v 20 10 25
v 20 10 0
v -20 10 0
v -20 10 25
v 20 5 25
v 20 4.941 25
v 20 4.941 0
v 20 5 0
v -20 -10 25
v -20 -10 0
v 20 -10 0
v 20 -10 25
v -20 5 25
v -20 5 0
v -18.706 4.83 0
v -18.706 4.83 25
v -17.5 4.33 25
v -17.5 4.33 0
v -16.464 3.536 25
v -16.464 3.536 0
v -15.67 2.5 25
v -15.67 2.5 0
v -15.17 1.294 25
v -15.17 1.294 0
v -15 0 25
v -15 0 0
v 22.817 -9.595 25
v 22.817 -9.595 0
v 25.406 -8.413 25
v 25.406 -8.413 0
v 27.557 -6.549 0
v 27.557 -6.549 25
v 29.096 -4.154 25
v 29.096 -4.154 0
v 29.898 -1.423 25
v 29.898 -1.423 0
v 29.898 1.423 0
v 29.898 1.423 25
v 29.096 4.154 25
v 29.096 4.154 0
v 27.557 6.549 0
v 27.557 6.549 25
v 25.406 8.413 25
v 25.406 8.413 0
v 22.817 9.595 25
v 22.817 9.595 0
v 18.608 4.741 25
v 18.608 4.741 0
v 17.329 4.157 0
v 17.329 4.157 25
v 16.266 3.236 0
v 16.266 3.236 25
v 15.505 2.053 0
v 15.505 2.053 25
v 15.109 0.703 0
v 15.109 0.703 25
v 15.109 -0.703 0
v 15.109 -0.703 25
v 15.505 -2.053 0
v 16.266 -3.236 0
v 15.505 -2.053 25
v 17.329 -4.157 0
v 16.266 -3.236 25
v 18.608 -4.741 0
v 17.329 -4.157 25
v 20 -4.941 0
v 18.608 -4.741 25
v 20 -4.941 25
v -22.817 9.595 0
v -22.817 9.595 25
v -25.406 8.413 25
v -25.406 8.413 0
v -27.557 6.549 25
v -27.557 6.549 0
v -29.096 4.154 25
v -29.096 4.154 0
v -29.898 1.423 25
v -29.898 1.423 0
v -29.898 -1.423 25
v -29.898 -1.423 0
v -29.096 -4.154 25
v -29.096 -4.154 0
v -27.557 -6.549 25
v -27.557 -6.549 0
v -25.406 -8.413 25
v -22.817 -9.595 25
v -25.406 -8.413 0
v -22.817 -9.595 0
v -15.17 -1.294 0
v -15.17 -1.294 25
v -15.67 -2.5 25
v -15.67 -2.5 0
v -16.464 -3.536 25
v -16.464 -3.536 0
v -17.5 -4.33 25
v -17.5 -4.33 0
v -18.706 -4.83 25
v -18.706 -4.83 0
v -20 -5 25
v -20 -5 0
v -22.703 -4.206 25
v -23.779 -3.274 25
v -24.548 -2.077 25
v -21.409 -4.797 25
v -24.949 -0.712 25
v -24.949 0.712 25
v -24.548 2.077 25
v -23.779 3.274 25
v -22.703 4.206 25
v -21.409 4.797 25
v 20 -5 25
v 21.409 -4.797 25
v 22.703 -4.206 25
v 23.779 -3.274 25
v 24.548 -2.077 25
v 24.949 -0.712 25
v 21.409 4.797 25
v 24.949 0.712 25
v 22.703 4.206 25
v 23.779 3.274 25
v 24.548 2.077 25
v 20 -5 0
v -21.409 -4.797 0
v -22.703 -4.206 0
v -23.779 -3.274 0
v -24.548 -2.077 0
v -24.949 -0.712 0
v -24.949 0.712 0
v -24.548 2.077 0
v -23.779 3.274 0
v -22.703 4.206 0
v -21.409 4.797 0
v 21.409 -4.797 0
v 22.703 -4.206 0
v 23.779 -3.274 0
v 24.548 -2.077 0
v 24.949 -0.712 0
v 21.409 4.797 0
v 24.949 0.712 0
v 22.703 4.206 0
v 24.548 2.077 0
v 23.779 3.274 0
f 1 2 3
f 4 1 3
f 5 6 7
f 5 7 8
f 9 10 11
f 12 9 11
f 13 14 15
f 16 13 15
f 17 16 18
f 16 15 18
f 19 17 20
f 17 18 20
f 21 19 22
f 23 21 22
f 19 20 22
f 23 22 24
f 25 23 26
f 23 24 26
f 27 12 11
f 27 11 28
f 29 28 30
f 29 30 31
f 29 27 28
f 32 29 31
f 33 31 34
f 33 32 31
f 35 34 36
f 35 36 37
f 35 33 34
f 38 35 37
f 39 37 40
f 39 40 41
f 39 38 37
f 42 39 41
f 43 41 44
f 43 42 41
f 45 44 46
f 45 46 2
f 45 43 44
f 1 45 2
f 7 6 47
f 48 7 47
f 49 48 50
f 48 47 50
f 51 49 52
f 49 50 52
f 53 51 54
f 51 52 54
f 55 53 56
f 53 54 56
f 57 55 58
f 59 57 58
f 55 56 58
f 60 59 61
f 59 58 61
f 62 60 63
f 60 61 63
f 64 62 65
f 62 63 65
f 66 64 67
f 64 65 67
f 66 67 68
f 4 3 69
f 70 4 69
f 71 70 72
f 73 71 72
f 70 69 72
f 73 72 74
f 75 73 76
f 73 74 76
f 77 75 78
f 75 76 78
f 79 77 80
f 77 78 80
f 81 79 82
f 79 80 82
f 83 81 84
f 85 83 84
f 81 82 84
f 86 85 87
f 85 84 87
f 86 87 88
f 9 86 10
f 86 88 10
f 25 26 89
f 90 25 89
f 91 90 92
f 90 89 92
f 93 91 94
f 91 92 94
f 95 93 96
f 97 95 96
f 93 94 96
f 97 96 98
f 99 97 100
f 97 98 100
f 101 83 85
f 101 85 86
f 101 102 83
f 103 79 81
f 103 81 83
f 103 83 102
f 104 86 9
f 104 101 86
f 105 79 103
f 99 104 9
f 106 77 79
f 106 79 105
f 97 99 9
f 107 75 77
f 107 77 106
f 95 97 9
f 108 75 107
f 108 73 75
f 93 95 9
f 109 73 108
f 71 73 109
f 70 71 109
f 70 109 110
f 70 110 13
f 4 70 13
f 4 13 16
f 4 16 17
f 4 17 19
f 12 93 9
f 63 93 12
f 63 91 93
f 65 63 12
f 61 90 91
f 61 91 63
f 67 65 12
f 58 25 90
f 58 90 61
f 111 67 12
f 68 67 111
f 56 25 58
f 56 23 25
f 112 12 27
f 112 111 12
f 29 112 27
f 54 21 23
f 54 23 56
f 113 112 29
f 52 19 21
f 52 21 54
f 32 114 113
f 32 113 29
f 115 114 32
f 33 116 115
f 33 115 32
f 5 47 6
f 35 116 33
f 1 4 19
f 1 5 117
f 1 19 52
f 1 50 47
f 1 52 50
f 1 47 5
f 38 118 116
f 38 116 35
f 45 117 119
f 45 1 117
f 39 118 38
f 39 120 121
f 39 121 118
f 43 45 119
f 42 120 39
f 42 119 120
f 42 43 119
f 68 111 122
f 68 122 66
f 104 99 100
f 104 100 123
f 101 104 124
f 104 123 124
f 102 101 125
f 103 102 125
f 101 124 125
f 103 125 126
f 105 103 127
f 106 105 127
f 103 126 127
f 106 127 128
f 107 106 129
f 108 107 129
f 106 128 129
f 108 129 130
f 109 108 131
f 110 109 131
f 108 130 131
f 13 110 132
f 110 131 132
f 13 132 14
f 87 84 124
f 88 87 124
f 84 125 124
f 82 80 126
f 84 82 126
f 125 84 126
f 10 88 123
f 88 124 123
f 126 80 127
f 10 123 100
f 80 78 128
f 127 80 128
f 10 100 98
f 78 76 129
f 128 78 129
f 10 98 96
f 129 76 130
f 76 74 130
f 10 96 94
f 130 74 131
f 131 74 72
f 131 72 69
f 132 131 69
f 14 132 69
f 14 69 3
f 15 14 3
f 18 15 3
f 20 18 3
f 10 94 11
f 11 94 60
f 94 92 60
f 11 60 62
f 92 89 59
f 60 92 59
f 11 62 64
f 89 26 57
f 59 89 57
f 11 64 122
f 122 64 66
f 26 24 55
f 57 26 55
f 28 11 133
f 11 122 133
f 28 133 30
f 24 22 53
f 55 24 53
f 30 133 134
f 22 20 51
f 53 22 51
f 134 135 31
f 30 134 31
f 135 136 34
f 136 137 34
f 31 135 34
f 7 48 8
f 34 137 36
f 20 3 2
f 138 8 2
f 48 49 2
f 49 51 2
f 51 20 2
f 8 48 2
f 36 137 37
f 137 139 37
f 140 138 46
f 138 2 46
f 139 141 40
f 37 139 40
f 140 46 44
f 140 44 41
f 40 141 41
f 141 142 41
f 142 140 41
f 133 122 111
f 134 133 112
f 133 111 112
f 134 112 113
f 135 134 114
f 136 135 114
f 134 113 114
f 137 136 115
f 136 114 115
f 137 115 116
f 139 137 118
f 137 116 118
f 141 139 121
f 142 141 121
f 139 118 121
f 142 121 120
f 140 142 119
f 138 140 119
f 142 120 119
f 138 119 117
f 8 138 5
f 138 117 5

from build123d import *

# Parameters (mm, degrees)
F1_DEPTH = 25
F2_R     = 10
F2_R_2   = 5
F3_DEPTH = 25
F4_R     = 4.9411574471
F5_DEPTH = 25.001


with BuildPart() as f1:
    # F0 (on Top) → F1 (new body)
    with BuildSketch(Plane.XY):
        with BuildLine():
            Line((-20, -10), (20, -10))
            Line((20, -10), (20, 10))
            Line((20, 10), (-20, 10))
            ThreePointArc((-20, 10), (-12.9289321881, 7.0710678119), (-10, 0))
            ThreePointArc((-10, 0), (-12.9289321881, -7.0710678119), (-20, -10))
        make_face()
        with BuildLine():
            ThreePointArc((-20, 10), (-30, 0), (-20, -10))
            Line((-20, -10), (-20, -5))
            ThreePointArc((-20, -5), (-25, 0), (-20, 5))
            Line((-20, 5), (-20, 10))
        make_face()
        with BuildLine():
            Line((-20, -5), (-20, -10))
            ThreePointArc((-20, -10), (-12.9289321881, -7.0710678119), (-10, 0))
            ThreePointArc((-10, 0), (-12.9289321881, 7.0710678119), (-20, 10))
            Line((-20, 10), (-20, 5))
            ThreePointArc((-20, 5), (-16.4644660941, 3.5355339059), (-15, 0))
            ThreePointArc((-15, 0), (-16.4644660941, -3.5355339059), (-20, -5))
        make_face()
    extrude(amount=F1_DEPTH)

    # F2 (on face) → F3 (join)
    with BuildSketch(Plane.XY.offset(25)):
        with Locations((20, 0)):
            Circle(F2_R)
        with Locations((20, 0)):
            Circle(F2_R_2, mode=Mode.SUBTRACT)
    extrude(amount=-F3_DEPTH)

    # F4 (on face) → F5 (cut, through all)
    with BuildSketch(Plane.XY.offset(25)):
        with Locations((20, 0)):
            Circle(F4_R)
    extrude(amount=-F5_DEPTH, mode=Mode.SUBTRACT)


solid = f1.part
